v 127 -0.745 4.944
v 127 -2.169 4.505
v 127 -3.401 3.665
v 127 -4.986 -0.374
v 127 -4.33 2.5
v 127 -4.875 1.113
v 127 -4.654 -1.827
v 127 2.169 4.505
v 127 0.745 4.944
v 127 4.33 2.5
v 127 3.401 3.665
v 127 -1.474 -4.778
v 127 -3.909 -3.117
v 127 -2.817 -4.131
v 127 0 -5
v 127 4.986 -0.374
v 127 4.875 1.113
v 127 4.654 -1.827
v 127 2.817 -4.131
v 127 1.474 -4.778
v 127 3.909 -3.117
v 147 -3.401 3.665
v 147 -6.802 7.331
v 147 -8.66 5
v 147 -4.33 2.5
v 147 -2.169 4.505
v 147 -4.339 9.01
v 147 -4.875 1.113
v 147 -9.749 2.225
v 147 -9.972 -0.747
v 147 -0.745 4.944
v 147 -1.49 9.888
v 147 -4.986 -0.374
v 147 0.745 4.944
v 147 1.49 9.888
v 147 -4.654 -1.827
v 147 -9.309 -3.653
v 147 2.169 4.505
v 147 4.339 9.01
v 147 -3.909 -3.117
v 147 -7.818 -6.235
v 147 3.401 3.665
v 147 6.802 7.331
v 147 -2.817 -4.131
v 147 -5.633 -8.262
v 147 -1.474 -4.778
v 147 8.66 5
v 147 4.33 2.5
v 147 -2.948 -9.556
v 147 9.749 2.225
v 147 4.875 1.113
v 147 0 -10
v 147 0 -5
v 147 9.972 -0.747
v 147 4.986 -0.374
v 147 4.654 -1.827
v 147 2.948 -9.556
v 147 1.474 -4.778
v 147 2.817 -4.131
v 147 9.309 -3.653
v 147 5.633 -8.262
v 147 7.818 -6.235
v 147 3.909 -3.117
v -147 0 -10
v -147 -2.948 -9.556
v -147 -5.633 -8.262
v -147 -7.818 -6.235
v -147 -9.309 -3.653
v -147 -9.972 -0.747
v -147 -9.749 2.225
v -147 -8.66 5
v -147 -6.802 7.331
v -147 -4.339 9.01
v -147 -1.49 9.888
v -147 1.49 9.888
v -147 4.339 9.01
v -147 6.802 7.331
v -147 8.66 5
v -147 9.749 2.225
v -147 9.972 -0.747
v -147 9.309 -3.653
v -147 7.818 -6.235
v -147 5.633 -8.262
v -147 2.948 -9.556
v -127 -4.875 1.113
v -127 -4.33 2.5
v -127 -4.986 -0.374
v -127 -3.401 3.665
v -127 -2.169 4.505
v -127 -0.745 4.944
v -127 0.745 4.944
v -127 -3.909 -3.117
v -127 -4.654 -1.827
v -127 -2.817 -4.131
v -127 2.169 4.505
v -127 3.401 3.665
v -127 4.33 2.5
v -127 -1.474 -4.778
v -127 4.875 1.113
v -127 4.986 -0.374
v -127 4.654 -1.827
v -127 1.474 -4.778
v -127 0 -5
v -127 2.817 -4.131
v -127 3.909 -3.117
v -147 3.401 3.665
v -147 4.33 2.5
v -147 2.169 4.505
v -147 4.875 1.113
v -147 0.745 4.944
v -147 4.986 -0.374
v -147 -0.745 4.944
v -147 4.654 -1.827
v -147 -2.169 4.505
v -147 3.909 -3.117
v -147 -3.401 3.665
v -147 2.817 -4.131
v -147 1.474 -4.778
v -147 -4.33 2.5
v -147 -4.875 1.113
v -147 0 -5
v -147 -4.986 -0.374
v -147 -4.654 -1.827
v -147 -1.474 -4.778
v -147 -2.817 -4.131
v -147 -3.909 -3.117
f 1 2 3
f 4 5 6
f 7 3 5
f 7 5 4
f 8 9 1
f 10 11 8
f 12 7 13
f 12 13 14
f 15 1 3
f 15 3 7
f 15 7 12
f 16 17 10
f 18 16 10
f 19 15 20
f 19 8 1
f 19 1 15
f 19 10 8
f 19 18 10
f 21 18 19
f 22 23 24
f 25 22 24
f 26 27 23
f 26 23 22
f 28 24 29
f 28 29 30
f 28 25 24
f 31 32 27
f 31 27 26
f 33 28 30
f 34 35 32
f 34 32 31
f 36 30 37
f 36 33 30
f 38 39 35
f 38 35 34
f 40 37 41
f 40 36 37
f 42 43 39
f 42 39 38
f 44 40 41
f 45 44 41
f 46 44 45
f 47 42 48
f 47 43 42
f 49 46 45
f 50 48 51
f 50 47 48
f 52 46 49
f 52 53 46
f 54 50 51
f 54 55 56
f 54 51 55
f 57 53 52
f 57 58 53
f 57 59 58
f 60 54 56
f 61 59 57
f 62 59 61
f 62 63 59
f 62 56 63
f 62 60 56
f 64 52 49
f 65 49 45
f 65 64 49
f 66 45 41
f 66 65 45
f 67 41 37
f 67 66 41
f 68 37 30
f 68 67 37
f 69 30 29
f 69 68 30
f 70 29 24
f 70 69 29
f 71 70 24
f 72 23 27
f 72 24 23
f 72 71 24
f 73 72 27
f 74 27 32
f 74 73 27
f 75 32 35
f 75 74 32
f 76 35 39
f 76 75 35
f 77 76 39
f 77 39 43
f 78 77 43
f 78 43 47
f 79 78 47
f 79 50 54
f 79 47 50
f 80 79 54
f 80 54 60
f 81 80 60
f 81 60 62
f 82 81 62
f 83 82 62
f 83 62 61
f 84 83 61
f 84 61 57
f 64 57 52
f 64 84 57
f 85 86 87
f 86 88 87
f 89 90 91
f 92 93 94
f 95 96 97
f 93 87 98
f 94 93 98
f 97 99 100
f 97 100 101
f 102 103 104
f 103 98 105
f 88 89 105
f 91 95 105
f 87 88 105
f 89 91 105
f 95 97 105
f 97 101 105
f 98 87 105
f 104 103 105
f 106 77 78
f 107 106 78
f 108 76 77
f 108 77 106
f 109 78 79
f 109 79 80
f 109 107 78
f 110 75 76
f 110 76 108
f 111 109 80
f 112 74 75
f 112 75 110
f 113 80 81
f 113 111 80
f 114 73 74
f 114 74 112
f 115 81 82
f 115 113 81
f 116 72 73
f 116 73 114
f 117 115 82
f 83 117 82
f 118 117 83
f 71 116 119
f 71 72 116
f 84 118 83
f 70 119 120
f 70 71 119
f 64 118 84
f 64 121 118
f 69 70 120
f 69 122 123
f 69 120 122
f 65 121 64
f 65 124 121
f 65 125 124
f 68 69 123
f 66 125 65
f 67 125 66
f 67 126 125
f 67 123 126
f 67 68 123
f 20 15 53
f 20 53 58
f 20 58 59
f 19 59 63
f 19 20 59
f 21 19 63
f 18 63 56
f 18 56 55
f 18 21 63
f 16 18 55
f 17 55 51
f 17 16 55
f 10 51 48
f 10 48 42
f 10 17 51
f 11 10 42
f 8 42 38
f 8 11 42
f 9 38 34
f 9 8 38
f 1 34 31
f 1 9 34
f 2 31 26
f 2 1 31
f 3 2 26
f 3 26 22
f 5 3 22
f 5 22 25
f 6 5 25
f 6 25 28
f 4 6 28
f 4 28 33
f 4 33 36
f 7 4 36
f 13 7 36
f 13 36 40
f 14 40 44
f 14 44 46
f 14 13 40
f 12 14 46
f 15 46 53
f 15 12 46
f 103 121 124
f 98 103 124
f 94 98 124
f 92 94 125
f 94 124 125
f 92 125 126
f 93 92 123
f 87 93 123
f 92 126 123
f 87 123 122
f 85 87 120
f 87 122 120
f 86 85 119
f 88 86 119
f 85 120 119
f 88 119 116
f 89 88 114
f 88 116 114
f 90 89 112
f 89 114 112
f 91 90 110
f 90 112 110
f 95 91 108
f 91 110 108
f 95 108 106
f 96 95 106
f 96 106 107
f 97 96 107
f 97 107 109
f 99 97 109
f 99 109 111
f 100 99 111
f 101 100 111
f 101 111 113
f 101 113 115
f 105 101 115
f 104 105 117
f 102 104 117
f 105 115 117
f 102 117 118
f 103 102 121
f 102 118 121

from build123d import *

# Parameters (mm, degrees)
BOSS_EXTRUDE1_DEPTH      = 127
BOSS_EXTRUDE1_DEPTH_BACK = 127
SKETCH1_R                = 10
SKETCH2_R                = 10
SKETCH2_R_2              = 5
BOSS_EXTRUDE2_DEPTH      = 20
BOSS_EXTRUDE3_START      = 20
SKETCH3_R                = 10
SKETCH3_R_2              = 5
BOSS_EXTRUDE3_DEPTH      = 20


with BuildPart() as part:
    # Sketch1 → Boss-Extrude1 (new, two sides: drawn at the far end of the back side and taken through both)
    with BuildSketch(Plane(origin=(0, 0, 0), x_dir=(0, 0, -1), z_dir=(1, 0, 0)).offset(-BOSS_EXTRUDE1_DEPTH_BACK)):
        Circle(SKETCH1_R)
    extrude(amount=BOSS_EXTRUDE1_DEPTH + BOSS_EXTRUDE1_DEPTH_BACK)

    # Sketch2 → Boss-Extrude2 (add)
    with BuildSketch(Plane(origin=(127, 0, 0), x_dir=(0, 0, -1), z_dir=(1, 0, 0))):
        Circle(SKETCH2_R)
        Circle(SKETCH2_R_2, mode=Mode.SUBTRACT)
    extrude(amount=BOSS_EXTRUDE2_DEPTH)

    # Sketch3 → Boss-Extrude3 (add)
    with BuildSketch(Plane.ZY.offset(127).offset(BOSS_EXTRUDE3_START)):
        Circle(SKETCH3_R)
        Circle(SKETCH3_R_2, mode=Mode.SUBTRACT)
    extrude(amount=-BOSS_EXTRUDE3_DEPTH)


solid = part.part
